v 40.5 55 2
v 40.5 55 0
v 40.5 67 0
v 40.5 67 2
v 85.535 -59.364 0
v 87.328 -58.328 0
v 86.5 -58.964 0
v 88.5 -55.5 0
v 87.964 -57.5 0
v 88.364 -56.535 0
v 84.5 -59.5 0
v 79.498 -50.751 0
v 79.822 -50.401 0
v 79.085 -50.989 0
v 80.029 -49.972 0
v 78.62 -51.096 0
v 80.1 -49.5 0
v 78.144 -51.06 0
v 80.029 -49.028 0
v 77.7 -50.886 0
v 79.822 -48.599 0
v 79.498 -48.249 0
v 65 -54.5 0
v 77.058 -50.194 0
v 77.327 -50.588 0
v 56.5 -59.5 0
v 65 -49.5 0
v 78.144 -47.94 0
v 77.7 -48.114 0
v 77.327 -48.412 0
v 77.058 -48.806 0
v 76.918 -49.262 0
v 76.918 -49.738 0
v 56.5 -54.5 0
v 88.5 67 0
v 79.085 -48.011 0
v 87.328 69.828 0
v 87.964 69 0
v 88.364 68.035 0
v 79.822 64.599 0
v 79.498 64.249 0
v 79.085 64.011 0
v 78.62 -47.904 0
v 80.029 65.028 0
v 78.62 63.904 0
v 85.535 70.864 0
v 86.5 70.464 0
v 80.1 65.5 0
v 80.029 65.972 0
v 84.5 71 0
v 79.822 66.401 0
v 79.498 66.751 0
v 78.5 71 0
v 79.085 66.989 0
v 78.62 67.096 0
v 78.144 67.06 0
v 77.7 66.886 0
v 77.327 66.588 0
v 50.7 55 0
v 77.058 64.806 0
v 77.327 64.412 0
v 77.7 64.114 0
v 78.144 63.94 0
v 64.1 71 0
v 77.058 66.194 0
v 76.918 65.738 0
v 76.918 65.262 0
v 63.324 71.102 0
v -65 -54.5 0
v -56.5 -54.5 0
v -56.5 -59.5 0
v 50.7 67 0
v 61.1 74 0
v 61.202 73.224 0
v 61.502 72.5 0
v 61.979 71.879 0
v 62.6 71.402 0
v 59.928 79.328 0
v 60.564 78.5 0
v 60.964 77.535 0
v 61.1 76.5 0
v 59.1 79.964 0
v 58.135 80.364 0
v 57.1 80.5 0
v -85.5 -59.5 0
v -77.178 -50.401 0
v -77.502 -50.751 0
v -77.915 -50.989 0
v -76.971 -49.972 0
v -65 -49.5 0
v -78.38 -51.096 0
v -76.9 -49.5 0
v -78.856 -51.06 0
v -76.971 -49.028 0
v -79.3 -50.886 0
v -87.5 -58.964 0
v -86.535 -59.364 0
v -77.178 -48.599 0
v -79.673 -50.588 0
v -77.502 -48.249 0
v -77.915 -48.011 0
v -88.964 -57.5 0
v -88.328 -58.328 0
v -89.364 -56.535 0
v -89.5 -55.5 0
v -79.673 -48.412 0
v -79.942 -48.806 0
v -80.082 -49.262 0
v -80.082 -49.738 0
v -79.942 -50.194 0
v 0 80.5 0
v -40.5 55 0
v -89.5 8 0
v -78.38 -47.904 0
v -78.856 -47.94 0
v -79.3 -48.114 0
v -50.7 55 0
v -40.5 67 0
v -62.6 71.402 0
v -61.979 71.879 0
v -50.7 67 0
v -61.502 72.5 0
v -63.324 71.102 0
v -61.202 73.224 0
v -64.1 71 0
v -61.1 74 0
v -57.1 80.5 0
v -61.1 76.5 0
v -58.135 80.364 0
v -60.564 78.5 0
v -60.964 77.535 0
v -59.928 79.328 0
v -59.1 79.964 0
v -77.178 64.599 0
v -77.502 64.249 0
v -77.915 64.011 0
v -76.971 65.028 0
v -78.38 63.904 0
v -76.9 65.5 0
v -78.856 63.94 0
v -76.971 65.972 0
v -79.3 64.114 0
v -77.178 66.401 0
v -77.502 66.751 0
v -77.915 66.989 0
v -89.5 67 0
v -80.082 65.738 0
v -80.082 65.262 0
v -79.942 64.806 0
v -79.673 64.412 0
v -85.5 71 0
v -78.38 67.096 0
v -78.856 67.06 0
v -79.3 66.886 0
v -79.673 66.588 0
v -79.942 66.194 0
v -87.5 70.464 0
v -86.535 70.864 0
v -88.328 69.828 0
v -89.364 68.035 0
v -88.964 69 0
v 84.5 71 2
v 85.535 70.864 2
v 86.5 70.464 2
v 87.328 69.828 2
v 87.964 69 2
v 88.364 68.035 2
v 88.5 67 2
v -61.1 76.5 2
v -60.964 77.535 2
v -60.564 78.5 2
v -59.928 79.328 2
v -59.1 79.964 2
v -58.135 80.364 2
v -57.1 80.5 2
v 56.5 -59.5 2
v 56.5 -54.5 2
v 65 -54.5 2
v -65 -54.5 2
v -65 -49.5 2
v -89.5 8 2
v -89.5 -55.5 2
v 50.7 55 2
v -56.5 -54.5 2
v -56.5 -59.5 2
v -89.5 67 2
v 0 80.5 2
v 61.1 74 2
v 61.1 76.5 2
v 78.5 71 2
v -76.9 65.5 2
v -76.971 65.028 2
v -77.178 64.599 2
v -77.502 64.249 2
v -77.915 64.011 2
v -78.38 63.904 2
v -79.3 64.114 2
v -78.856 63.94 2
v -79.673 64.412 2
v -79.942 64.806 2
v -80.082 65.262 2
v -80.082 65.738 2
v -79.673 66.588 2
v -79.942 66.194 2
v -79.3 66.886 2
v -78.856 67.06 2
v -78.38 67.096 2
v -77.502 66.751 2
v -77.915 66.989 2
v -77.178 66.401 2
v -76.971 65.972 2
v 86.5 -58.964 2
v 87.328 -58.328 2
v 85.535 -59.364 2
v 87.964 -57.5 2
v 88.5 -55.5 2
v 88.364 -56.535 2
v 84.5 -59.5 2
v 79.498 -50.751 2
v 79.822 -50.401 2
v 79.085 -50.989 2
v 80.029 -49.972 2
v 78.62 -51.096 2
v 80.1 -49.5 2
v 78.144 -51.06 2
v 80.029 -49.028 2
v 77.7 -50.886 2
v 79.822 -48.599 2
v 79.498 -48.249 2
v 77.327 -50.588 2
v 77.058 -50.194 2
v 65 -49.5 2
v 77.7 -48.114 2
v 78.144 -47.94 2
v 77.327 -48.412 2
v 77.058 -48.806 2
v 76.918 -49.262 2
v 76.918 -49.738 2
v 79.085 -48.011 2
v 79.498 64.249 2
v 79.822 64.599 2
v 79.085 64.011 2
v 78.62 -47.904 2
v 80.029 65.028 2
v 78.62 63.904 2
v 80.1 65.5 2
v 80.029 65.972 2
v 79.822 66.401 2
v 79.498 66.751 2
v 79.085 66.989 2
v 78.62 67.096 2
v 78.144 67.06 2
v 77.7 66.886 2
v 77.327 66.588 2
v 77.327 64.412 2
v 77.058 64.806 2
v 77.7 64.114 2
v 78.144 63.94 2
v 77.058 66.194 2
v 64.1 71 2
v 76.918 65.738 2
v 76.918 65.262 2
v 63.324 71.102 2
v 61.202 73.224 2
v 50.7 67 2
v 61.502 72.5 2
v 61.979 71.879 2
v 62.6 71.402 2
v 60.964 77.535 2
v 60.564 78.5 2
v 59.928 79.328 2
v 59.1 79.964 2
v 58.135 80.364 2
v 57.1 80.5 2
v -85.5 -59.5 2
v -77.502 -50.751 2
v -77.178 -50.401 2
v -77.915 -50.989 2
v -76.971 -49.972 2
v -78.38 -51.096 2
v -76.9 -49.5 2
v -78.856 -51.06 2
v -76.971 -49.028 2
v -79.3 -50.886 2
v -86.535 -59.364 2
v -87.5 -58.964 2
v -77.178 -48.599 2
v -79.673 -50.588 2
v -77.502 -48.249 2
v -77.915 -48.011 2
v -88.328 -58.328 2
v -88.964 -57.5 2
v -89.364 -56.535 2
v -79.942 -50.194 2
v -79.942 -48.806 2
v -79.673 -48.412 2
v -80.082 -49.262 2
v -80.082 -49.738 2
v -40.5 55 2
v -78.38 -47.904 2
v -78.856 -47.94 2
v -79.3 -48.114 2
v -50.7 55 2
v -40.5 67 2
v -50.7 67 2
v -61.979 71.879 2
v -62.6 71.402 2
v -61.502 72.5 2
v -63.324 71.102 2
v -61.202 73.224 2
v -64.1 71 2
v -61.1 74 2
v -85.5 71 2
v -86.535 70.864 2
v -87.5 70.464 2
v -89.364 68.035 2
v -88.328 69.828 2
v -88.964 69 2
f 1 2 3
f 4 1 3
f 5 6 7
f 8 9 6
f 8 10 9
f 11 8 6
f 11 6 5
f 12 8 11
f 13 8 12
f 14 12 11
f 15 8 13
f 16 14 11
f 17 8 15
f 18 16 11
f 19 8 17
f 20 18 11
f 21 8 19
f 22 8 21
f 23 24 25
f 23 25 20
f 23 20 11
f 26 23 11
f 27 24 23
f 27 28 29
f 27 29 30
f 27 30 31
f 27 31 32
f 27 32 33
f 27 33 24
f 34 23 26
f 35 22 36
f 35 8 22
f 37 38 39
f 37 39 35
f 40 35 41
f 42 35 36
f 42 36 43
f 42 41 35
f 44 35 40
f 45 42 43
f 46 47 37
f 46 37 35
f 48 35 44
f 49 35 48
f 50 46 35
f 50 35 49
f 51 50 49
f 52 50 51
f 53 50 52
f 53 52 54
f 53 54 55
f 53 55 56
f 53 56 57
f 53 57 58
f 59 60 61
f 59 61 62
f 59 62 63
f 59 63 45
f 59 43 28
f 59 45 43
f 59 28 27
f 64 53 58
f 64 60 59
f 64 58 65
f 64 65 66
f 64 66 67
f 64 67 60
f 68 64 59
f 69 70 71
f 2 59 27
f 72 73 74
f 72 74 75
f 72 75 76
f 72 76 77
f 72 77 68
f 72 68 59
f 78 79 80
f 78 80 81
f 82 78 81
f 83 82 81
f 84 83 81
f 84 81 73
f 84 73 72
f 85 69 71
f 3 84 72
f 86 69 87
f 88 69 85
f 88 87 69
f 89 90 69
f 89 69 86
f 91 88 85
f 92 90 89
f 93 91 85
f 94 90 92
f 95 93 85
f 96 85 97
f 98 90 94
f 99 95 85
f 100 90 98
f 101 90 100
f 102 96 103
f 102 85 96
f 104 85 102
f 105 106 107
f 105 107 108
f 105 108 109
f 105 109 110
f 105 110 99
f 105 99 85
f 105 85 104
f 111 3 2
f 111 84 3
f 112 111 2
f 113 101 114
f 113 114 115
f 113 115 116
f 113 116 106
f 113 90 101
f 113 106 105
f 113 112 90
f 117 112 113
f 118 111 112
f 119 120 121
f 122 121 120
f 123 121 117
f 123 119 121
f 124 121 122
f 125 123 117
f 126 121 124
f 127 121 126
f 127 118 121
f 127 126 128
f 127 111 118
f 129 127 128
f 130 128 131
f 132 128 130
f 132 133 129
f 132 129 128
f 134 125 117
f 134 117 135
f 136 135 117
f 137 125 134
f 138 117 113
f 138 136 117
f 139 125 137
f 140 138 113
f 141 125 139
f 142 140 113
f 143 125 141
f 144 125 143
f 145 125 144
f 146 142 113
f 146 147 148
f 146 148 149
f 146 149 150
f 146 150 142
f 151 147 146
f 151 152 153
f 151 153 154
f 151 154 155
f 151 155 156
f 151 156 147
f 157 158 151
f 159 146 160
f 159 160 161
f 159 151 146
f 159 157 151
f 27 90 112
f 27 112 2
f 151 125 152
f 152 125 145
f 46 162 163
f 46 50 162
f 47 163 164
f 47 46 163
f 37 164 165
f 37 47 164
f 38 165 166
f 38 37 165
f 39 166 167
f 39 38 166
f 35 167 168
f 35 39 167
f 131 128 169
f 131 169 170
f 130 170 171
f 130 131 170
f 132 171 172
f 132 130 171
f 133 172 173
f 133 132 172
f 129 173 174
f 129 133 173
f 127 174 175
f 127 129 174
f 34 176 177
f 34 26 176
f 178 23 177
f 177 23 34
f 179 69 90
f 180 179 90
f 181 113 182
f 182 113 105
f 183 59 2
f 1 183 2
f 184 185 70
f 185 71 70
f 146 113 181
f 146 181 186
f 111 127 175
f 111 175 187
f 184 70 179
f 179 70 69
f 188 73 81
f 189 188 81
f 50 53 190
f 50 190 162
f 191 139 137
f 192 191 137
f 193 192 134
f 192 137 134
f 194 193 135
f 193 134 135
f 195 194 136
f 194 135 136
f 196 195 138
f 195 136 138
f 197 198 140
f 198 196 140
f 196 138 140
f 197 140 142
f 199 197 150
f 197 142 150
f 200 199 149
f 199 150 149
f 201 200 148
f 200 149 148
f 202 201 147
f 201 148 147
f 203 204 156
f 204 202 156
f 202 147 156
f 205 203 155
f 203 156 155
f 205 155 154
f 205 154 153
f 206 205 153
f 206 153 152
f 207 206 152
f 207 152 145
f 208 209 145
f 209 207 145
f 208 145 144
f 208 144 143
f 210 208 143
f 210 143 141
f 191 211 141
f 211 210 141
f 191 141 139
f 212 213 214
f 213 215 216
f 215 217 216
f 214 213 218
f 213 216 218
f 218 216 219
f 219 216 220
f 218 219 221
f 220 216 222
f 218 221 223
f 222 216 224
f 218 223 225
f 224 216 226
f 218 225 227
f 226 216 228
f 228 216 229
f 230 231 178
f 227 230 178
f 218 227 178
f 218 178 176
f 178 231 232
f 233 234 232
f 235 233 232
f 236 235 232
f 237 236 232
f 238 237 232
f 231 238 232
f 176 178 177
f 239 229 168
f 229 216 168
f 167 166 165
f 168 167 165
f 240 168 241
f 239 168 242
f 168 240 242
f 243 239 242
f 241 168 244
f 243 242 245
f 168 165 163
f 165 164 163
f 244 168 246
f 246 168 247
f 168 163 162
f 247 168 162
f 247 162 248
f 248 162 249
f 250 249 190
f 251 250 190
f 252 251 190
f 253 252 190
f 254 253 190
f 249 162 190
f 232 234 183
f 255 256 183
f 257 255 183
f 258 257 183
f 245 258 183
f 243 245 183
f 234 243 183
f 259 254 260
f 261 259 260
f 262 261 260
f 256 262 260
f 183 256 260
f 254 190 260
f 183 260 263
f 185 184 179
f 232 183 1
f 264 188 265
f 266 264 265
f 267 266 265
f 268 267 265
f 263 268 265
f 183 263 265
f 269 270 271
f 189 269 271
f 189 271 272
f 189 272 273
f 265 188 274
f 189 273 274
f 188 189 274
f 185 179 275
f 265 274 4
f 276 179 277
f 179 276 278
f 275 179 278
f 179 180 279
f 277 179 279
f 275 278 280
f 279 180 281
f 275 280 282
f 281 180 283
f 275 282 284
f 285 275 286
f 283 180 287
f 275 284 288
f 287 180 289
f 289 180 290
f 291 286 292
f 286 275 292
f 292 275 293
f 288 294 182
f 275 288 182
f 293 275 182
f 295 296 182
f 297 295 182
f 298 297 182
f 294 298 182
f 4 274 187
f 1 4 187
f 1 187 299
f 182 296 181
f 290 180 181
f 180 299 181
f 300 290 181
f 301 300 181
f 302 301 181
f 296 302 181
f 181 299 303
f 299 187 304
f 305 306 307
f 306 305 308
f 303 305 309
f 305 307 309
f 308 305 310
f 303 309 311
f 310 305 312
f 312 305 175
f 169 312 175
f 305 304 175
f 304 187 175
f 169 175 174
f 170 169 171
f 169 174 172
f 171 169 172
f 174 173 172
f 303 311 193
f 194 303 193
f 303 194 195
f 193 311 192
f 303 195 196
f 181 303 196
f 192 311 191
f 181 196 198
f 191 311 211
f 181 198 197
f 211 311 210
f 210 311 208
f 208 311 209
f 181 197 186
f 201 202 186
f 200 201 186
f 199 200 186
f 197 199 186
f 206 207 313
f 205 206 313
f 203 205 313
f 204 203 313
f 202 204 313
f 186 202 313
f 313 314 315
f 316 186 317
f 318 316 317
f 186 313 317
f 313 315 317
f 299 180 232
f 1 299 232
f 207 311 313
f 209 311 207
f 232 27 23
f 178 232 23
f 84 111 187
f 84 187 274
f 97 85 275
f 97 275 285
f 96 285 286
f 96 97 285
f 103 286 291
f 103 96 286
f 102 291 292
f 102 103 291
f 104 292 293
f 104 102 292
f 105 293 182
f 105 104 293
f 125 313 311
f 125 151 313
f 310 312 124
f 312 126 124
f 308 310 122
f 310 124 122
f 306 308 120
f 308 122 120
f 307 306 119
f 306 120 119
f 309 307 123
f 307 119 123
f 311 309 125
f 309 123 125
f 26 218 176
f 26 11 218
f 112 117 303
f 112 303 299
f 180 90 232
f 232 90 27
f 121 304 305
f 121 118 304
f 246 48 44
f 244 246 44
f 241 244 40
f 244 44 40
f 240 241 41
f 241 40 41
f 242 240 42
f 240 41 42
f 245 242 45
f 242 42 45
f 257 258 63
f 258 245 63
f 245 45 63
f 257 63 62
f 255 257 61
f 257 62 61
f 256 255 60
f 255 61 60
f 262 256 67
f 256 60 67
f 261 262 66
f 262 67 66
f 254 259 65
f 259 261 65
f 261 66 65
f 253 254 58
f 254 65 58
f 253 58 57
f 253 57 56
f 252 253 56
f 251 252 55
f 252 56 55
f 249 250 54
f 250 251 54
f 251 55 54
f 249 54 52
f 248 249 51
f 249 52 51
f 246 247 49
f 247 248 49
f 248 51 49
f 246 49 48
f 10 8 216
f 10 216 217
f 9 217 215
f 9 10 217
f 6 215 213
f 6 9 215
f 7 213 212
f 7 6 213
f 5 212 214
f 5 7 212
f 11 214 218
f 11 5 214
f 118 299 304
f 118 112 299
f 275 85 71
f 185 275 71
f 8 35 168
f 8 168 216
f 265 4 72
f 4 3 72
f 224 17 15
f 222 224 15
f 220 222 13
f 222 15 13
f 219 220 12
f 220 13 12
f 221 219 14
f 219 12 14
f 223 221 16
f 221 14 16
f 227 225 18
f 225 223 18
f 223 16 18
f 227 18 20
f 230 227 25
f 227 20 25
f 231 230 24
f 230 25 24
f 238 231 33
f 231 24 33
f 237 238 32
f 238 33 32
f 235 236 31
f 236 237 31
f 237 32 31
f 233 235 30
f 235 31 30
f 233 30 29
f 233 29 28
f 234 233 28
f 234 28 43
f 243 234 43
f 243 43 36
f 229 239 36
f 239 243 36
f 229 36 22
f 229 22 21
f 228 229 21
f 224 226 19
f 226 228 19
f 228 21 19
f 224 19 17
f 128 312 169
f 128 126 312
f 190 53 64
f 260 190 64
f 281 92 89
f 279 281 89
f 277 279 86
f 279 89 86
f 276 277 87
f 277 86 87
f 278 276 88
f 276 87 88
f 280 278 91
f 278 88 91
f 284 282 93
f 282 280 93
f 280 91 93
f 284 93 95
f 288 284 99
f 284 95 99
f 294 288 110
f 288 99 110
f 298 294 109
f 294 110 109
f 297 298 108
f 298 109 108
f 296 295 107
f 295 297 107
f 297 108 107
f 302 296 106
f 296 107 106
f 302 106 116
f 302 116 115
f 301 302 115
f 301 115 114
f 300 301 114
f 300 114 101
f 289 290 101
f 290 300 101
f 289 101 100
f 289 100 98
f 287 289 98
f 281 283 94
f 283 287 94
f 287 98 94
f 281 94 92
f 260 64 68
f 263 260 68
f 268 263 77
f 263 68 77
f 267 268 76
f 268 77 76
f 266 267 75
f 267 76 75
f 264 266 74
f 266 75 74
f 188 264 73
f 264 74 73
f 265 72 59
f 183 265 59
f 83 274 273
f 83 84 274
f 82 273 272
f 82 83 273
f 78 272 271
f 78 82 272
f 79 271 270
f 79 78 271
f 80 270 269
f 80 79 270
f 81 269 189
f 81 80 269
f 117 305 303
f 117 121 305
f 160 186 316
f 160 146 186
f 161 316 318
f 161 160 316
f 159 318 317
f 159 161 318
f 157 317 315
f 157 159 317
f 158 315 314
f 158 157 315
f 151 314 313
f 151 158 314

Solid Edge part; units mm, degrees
sketch "Sketch1" plane through (0, 0, 0) normal (0, 0, 1) x (1, 0, 0)
  arc A0 (-64.1, 71) -> (-61.1, 74) centre (-64.1, 74) ccw
  line L0 (-61.1, 74) -> (-61.1, 76.5)
  arc A1 (-61.1, 76.5) -> (-57.1, 80.5) centre (-57.1, 76.5) cw
  line L1 (-57.1, 80.5) -> (0, 80.5)
  line L2 (0, 80.5) -> (57.1, 80.5)
  arc A2 (57.1, 80.5) -> (61.1, 76.5) centre (57.1, 76.5) cw
  line L3 (61.1, 74) -> (61.1, 76.5)
  arc A3 (61.1, 74) -> (64.1, 71) centre (64.1, 74) ccw
  line L4 (78.5, 71) -> (64.1, 71)
  line L5 (78.5, 71) -> (84.5, 71)
  arc A4 (84.5, 71) -> (88.5, 67) centre (84.5, 67) cw
  line L6 (88.5, 67) -> (88.5, -55.5)
  arc A5 (84.5, -59.5) -> (88.5, -55.5) centre (84.5, -55.5) ccw
  line L7 (84.5, -59.5) -> (56.5, -59.5)
  line L8 (56.5, -59.5) -> (56.5, -54.5)
  line L9 (65, -54.5) -> (56.5, -54.5)
  line L10 (65, -49.5) -> (65, -54.5)
  line L11 (-65, -49.5) -> (65, -49.5)
  line L12 (-65, -54.5) -> (-65, -49.5)
  line L13 (-56.5, -54.5) -> (-65, -54.5)
  line L14 (-56.5, -59.5) -> (-56.5, -54.5)
  line L15 (-85.5, -59.5) -> (-56.5, -59.5)
  arc A6 (-89.5, -55.5) -> (-85.5, -59.5) centre (-85.5, -55.5) ccw
  line L16 (-89.5, 8) -> (-89.5, -55.5)
  line L17 (-89.5, 8) -> (-89.5, 67)
  arc A7 (-89.5, 67) -> (-85.5, 71) centre (-85.5, 67) cw
  line L18 (-85.5, 71) -> (-64.1, 71)
  circle A8 centre (78.5, -49.5) radius 1.6
  circle A9 centre (-78.5, -49.5) radius 1.6
  circle A10 centre (-78.5, 65.5) radius 1.6
  line L19 (-50.7, 55) -> (-40.5, 55)
  line L20 (-40.5, 55) -> (-40.5, 67)
  line L21 (-40.5, 67) -> (-50.7, 67)
  line L22 (-50.7, 67) -> (-50.7, 55)
  line L23 (50.7, 55) -> (40.5, 55)
  line L24 (40.5, 55) -> (40.5, 67)
  line L25 (40.5, 67) -> (50.7, 67)
  line L26 (50.7, 67) -> (50.7, 55)
  circle A11 centre (78.5, 65.5) radius 1.6
extrude "Protrusion1" add sketch "Sketch1" along normal blind 2
